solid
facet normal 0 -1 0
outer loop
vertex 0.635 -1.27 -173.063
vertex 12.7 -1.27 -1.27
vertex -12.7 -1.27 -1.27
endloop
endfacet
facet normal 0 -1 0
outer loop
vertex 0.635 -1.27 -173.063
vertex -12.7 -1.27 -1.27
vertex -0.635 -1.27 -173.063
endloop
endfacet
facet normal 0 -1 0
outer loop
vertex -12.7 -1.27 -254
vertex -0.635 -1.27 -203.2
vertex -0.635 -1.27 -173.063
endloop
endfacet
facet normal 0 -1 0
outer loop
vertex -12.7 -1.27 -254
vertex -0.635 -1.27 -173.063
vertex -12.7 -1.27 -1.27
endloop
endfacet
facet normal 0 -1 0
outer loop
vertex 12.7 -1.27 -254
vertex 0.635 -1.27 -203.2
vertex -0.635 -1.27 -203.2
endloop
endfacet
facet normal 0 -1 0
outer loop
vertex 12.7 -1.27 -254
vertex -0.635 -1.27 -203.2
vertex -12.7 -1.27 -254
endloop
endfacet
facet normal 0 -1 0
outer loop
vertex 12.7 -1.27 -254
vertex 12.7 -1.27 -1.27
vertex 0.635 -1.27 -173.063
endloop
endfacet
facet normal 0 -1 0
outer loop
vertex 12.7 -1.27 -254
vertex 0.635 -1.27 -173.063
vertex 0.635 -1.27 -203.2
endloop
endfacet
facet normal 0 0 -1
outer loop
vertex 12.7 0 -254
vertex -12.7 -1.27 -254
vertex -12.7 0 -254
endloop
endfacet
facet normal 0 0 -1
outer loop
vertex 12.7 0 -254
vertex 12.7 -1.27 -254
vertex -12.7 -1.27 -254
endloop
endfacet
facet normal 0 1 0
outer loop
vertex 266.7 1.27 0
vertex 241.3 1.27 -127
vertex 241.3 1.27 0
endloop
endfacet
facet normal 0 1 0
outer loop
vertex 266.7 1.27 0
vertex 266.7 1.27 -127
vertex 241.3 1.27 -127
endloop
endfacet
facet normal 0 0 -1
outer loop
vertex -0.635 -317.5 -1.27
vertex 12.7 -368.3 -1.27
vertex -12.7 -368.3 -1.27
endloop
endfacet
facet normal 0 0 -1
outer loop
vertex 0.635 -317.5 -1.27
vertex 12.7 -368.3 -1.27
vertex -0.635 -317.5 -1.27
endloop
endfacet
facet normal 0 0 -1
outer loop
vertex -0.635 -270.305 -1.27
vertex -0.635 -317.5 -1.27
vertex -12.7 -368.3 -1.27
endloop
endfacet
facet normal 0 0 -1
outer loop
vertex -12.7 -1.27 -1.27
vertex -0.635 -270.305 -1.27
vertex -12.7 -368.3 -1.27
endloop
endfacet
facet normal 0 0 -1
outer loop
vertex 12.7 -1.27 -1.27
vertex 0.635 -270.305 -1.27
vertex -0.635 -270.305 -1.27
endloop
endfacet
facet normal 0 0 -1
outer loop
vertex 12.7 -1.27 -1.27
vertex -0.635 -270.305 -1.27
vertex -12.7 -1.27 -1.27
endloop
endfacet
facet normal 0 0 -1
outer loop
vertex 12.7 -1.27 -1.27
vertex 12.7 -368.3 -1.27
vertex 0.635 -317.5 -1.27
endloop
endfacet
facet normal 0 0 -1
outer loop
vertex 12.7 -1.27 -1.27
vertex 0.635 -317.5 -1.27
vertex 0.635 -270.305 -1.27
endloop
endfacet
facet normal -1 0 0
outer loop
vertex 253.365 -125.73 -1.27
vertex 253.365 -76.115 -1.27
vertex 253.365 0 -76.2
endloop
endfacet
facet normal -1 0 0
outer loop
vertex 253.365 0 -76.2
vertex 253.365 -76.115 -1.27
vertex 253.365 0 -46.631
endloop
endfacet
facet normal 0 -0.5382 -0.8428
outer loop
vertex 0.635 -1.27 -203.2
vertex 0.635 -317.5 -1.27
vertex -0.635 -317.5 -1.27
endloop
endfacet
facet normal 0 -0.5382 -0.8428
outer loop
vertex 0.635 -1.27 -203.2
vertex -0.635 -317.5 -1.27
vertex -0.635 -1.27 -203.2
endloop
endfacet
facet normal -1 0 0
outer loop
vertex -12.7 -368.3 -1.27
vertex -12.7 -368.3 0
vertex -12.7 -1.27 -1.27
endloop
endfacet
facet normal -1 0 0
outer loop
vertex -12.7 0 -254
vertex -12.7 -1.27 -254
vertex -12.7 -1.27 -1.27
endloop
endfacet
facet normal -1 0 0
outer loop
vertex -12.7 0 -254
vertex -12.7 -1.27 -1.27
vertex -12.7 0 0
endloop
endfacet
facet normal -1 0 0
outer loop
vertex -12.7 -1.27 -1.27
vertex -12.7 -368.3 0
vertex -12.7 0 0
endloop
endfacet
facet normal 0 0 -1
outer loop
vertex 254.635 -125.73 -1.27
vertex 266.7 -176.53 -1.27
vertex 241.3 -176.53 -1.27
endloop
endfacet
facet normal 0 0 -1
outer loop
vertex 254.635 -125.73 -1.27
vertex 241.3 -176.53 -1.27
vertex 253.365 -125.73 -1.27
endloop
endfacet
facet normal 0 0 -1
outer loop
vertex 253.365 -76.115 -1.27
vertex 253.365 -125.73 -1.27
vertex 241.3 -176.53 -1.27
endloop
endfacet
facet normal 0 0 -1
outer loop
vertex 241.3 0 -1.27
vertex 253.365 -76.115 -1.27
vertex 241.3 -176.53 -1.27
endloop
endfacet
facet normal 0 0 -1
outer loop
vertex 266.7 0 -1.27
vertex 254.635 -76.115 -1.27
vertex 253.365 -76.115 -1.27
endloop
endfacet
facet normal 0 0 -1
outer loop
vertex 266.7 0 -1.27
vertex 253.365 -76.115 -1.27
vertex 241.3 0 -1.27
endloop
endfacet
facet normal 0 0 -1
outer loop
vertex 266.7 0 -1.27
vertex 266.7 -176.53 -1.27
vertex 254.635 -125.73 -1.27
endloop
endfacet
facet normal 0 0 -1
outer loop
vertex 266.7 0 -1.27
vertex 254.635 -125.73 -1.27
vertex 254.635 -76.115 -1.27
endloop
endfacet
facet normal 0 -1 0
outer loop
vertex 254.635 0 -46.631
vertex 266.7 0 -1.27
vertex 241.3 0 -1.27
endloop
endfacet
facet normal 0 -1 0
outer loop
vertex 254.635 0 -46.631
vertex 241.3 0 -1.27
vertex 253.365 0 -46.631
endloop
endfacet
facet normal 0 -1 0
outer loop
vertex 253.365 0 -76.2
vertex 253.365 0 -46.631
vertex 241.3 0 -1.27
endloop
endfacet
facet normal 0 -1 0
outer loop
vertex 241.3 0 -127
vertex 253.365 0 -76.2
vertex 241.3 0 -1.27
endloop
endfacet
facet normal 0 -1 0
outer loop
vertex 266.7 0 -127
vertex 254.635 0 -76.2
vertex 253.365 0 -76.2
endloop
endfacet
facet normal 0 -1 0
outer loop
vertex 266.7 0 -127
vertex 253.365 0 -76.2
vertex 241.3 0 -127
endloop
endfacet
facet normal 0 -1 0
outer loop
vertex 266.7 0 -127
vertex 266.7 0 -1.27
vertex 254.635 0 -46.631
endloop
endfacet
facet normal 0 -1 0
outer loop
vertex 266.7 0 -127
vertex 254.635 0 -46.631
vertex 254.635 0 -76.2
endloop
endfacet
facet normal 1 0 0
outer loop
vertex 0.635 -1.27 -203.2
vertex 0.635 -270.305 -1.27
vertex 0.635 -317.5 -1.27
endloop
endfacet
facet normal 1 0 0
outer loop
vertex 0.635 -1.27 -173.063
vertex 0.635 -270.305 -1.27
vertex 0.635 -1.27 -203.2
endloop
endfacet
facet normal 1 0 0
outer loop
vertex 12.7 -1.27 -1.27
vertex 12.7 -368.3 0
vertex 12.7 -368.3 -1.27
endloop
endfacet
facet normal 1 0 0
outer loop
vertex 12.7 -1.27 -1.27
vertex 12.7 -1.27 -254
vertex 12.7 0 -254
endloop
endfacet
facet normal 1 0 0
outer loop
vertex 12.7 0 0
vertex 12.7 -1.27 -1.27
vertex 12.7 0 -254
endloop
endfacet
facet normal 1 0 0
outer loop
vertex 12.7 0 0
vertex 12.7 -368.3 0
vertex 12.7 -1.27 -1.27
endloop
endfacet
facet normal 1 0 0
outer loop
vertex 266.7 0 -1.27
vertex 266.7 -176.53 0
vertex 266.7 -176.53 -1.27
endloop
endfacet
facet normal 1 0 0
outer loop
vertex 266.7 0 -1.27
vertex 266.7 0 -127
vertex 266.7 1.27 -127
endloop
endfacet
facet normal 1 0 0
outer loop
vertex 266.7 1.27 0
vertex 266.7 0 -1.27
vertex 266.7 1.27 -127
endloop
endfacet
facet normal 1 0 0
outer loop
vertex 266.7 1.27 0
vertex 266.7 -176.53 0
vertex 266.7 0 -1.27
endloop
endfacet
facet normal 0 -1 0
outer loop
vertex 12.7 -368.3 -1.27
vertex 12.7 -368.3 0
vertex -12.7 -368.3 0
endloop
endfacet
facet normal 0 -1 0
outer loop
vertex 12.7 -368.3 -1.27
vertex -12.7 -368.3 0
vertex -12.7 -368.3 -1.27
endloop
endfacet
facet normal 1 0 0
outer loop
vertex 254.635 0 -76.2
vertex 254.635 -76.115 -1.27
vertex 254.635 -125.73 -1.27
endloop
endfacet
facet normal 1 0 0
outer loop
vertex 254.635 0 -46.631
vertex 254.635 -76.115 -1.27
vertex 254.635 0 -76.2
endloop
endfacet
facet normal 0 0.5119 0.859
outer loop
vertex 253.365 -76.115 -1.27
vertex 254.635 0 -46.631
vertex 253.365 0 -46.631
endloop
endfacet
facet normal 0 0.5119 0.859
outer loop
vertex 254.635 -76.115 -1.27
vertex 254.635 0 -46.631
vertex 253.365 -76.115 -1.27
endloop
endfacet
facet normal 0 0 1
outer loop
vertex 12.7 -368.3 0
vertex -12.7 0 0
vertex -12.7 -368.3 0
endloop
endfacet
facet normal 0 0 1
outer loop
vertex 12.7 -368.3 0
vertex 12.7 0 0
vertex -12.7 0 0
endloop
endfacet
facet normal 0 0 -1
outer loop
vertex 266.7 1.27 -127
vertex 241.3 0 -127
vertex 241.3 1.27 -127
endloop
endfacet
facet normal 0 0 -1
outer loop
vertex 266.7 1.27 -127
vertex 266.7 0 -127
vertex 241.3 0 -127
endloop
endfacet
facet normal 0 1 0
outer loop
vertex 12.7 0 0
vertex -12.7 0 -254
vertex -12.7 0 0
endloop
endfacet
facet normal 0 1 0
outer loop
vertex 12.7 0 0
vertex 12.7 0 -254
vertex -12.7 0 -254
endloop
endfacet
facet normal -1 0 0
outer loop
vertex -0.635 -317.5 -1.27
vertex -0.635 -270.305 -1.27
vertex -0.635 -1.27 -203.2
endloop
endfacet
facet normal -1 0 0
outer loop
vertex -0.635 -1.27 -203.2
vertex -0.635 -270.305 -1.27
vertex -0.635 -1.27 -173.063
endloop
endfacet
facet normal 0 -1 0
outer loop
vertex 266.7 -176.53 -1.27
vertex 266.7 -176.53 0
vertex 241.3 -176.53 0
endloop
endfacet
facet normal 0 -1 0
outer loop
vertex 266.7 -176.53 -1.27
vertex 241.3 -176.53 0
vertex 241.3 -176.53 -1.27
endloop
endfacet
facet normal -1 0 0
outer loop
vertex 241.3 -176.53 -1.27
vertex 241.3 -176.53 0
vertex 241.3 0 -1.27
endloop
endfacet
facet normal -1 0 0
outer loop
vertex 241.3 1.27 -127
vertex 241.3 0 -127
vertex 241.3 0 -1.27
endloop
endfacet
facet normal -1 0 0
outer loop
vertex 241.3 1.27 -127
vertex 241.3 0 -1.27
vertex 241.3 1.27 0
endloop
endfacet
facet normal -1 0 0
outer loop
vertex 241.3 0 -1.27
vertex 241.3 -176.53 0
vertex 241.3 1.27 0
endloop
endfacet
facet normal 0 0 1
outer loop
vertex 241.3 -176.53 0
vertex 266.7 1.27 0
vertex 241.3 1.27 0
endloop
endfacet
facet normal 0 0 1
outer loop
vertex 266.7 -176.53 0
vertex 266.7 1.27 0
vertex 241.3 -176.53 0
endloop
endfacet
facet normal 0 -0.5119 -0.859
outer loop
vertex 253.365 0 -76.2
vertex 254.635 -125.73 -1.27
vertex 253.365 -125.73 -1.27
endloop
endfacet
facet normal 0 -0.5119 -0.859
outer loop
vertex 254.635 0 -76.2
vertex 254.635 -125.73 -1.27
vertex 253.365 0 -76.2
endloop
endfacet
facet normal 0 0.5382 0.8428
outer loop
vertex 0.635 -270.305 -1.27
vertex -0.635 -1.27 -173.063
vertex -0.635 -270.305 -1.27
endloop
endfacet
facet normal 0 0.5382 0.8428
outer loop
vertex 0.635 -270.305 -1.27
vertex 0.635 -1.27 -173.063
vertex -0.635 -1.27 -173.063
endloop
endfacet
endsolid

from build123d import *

# Parameters (mm, degrees)
F1_DEPTH = 12.7
F3_DEPTH = 0.635
F6_DEPTH = 12.7
F8_DEPTH = 0.635


with BuildPart() as f1:
    # F0 (on Right) → F1 (new body, symmetric)
    with BuildSketch(Plane.YZ):
        Polygon((0, 0), (-368.3, 0), (-368.3, -1.27), (-1.27, -1.27), (-1.27, -254), (0, -254), align=None)
    extrude(amount=F1_DEPTH, both=True)

    # F2 (on Right) → F3 (join, symmetric)
    with BuildSketch(Plane.YZ):
        Polygon((-1.27, -173.063229), (-270.30468, -1.27), (-317.5, -1.27), (-1.27, -203.2), align=None)
    extrude(amount=F3_DEPTH, both=True)


with BuildPart() as f6:
    # F5 (on offset) → F6 (new body, symmetric)
    with BuildSketch(Plane.YZ.offset(254)):
        Polygon((1.27, 0), (-176.53, 0), (-176.53, -1.27), (0, -1.27), (0, -127), (1.27, -127), align=None)
    extrude(amount=F6_DEPTH, both=True)

    # F7 (on offset) → F8 (join, symmetric)
    with BuildSketch(Plane.YZ.offset(254)):
        Polygon((0, -46.631434), (-76.114949, -1.27), (-125.73, -1.27), (0, -76.2), align=None)
    extrude(amount=F8_DEPTH, both=True)


solid = Compound([f1.part, f6.part])
